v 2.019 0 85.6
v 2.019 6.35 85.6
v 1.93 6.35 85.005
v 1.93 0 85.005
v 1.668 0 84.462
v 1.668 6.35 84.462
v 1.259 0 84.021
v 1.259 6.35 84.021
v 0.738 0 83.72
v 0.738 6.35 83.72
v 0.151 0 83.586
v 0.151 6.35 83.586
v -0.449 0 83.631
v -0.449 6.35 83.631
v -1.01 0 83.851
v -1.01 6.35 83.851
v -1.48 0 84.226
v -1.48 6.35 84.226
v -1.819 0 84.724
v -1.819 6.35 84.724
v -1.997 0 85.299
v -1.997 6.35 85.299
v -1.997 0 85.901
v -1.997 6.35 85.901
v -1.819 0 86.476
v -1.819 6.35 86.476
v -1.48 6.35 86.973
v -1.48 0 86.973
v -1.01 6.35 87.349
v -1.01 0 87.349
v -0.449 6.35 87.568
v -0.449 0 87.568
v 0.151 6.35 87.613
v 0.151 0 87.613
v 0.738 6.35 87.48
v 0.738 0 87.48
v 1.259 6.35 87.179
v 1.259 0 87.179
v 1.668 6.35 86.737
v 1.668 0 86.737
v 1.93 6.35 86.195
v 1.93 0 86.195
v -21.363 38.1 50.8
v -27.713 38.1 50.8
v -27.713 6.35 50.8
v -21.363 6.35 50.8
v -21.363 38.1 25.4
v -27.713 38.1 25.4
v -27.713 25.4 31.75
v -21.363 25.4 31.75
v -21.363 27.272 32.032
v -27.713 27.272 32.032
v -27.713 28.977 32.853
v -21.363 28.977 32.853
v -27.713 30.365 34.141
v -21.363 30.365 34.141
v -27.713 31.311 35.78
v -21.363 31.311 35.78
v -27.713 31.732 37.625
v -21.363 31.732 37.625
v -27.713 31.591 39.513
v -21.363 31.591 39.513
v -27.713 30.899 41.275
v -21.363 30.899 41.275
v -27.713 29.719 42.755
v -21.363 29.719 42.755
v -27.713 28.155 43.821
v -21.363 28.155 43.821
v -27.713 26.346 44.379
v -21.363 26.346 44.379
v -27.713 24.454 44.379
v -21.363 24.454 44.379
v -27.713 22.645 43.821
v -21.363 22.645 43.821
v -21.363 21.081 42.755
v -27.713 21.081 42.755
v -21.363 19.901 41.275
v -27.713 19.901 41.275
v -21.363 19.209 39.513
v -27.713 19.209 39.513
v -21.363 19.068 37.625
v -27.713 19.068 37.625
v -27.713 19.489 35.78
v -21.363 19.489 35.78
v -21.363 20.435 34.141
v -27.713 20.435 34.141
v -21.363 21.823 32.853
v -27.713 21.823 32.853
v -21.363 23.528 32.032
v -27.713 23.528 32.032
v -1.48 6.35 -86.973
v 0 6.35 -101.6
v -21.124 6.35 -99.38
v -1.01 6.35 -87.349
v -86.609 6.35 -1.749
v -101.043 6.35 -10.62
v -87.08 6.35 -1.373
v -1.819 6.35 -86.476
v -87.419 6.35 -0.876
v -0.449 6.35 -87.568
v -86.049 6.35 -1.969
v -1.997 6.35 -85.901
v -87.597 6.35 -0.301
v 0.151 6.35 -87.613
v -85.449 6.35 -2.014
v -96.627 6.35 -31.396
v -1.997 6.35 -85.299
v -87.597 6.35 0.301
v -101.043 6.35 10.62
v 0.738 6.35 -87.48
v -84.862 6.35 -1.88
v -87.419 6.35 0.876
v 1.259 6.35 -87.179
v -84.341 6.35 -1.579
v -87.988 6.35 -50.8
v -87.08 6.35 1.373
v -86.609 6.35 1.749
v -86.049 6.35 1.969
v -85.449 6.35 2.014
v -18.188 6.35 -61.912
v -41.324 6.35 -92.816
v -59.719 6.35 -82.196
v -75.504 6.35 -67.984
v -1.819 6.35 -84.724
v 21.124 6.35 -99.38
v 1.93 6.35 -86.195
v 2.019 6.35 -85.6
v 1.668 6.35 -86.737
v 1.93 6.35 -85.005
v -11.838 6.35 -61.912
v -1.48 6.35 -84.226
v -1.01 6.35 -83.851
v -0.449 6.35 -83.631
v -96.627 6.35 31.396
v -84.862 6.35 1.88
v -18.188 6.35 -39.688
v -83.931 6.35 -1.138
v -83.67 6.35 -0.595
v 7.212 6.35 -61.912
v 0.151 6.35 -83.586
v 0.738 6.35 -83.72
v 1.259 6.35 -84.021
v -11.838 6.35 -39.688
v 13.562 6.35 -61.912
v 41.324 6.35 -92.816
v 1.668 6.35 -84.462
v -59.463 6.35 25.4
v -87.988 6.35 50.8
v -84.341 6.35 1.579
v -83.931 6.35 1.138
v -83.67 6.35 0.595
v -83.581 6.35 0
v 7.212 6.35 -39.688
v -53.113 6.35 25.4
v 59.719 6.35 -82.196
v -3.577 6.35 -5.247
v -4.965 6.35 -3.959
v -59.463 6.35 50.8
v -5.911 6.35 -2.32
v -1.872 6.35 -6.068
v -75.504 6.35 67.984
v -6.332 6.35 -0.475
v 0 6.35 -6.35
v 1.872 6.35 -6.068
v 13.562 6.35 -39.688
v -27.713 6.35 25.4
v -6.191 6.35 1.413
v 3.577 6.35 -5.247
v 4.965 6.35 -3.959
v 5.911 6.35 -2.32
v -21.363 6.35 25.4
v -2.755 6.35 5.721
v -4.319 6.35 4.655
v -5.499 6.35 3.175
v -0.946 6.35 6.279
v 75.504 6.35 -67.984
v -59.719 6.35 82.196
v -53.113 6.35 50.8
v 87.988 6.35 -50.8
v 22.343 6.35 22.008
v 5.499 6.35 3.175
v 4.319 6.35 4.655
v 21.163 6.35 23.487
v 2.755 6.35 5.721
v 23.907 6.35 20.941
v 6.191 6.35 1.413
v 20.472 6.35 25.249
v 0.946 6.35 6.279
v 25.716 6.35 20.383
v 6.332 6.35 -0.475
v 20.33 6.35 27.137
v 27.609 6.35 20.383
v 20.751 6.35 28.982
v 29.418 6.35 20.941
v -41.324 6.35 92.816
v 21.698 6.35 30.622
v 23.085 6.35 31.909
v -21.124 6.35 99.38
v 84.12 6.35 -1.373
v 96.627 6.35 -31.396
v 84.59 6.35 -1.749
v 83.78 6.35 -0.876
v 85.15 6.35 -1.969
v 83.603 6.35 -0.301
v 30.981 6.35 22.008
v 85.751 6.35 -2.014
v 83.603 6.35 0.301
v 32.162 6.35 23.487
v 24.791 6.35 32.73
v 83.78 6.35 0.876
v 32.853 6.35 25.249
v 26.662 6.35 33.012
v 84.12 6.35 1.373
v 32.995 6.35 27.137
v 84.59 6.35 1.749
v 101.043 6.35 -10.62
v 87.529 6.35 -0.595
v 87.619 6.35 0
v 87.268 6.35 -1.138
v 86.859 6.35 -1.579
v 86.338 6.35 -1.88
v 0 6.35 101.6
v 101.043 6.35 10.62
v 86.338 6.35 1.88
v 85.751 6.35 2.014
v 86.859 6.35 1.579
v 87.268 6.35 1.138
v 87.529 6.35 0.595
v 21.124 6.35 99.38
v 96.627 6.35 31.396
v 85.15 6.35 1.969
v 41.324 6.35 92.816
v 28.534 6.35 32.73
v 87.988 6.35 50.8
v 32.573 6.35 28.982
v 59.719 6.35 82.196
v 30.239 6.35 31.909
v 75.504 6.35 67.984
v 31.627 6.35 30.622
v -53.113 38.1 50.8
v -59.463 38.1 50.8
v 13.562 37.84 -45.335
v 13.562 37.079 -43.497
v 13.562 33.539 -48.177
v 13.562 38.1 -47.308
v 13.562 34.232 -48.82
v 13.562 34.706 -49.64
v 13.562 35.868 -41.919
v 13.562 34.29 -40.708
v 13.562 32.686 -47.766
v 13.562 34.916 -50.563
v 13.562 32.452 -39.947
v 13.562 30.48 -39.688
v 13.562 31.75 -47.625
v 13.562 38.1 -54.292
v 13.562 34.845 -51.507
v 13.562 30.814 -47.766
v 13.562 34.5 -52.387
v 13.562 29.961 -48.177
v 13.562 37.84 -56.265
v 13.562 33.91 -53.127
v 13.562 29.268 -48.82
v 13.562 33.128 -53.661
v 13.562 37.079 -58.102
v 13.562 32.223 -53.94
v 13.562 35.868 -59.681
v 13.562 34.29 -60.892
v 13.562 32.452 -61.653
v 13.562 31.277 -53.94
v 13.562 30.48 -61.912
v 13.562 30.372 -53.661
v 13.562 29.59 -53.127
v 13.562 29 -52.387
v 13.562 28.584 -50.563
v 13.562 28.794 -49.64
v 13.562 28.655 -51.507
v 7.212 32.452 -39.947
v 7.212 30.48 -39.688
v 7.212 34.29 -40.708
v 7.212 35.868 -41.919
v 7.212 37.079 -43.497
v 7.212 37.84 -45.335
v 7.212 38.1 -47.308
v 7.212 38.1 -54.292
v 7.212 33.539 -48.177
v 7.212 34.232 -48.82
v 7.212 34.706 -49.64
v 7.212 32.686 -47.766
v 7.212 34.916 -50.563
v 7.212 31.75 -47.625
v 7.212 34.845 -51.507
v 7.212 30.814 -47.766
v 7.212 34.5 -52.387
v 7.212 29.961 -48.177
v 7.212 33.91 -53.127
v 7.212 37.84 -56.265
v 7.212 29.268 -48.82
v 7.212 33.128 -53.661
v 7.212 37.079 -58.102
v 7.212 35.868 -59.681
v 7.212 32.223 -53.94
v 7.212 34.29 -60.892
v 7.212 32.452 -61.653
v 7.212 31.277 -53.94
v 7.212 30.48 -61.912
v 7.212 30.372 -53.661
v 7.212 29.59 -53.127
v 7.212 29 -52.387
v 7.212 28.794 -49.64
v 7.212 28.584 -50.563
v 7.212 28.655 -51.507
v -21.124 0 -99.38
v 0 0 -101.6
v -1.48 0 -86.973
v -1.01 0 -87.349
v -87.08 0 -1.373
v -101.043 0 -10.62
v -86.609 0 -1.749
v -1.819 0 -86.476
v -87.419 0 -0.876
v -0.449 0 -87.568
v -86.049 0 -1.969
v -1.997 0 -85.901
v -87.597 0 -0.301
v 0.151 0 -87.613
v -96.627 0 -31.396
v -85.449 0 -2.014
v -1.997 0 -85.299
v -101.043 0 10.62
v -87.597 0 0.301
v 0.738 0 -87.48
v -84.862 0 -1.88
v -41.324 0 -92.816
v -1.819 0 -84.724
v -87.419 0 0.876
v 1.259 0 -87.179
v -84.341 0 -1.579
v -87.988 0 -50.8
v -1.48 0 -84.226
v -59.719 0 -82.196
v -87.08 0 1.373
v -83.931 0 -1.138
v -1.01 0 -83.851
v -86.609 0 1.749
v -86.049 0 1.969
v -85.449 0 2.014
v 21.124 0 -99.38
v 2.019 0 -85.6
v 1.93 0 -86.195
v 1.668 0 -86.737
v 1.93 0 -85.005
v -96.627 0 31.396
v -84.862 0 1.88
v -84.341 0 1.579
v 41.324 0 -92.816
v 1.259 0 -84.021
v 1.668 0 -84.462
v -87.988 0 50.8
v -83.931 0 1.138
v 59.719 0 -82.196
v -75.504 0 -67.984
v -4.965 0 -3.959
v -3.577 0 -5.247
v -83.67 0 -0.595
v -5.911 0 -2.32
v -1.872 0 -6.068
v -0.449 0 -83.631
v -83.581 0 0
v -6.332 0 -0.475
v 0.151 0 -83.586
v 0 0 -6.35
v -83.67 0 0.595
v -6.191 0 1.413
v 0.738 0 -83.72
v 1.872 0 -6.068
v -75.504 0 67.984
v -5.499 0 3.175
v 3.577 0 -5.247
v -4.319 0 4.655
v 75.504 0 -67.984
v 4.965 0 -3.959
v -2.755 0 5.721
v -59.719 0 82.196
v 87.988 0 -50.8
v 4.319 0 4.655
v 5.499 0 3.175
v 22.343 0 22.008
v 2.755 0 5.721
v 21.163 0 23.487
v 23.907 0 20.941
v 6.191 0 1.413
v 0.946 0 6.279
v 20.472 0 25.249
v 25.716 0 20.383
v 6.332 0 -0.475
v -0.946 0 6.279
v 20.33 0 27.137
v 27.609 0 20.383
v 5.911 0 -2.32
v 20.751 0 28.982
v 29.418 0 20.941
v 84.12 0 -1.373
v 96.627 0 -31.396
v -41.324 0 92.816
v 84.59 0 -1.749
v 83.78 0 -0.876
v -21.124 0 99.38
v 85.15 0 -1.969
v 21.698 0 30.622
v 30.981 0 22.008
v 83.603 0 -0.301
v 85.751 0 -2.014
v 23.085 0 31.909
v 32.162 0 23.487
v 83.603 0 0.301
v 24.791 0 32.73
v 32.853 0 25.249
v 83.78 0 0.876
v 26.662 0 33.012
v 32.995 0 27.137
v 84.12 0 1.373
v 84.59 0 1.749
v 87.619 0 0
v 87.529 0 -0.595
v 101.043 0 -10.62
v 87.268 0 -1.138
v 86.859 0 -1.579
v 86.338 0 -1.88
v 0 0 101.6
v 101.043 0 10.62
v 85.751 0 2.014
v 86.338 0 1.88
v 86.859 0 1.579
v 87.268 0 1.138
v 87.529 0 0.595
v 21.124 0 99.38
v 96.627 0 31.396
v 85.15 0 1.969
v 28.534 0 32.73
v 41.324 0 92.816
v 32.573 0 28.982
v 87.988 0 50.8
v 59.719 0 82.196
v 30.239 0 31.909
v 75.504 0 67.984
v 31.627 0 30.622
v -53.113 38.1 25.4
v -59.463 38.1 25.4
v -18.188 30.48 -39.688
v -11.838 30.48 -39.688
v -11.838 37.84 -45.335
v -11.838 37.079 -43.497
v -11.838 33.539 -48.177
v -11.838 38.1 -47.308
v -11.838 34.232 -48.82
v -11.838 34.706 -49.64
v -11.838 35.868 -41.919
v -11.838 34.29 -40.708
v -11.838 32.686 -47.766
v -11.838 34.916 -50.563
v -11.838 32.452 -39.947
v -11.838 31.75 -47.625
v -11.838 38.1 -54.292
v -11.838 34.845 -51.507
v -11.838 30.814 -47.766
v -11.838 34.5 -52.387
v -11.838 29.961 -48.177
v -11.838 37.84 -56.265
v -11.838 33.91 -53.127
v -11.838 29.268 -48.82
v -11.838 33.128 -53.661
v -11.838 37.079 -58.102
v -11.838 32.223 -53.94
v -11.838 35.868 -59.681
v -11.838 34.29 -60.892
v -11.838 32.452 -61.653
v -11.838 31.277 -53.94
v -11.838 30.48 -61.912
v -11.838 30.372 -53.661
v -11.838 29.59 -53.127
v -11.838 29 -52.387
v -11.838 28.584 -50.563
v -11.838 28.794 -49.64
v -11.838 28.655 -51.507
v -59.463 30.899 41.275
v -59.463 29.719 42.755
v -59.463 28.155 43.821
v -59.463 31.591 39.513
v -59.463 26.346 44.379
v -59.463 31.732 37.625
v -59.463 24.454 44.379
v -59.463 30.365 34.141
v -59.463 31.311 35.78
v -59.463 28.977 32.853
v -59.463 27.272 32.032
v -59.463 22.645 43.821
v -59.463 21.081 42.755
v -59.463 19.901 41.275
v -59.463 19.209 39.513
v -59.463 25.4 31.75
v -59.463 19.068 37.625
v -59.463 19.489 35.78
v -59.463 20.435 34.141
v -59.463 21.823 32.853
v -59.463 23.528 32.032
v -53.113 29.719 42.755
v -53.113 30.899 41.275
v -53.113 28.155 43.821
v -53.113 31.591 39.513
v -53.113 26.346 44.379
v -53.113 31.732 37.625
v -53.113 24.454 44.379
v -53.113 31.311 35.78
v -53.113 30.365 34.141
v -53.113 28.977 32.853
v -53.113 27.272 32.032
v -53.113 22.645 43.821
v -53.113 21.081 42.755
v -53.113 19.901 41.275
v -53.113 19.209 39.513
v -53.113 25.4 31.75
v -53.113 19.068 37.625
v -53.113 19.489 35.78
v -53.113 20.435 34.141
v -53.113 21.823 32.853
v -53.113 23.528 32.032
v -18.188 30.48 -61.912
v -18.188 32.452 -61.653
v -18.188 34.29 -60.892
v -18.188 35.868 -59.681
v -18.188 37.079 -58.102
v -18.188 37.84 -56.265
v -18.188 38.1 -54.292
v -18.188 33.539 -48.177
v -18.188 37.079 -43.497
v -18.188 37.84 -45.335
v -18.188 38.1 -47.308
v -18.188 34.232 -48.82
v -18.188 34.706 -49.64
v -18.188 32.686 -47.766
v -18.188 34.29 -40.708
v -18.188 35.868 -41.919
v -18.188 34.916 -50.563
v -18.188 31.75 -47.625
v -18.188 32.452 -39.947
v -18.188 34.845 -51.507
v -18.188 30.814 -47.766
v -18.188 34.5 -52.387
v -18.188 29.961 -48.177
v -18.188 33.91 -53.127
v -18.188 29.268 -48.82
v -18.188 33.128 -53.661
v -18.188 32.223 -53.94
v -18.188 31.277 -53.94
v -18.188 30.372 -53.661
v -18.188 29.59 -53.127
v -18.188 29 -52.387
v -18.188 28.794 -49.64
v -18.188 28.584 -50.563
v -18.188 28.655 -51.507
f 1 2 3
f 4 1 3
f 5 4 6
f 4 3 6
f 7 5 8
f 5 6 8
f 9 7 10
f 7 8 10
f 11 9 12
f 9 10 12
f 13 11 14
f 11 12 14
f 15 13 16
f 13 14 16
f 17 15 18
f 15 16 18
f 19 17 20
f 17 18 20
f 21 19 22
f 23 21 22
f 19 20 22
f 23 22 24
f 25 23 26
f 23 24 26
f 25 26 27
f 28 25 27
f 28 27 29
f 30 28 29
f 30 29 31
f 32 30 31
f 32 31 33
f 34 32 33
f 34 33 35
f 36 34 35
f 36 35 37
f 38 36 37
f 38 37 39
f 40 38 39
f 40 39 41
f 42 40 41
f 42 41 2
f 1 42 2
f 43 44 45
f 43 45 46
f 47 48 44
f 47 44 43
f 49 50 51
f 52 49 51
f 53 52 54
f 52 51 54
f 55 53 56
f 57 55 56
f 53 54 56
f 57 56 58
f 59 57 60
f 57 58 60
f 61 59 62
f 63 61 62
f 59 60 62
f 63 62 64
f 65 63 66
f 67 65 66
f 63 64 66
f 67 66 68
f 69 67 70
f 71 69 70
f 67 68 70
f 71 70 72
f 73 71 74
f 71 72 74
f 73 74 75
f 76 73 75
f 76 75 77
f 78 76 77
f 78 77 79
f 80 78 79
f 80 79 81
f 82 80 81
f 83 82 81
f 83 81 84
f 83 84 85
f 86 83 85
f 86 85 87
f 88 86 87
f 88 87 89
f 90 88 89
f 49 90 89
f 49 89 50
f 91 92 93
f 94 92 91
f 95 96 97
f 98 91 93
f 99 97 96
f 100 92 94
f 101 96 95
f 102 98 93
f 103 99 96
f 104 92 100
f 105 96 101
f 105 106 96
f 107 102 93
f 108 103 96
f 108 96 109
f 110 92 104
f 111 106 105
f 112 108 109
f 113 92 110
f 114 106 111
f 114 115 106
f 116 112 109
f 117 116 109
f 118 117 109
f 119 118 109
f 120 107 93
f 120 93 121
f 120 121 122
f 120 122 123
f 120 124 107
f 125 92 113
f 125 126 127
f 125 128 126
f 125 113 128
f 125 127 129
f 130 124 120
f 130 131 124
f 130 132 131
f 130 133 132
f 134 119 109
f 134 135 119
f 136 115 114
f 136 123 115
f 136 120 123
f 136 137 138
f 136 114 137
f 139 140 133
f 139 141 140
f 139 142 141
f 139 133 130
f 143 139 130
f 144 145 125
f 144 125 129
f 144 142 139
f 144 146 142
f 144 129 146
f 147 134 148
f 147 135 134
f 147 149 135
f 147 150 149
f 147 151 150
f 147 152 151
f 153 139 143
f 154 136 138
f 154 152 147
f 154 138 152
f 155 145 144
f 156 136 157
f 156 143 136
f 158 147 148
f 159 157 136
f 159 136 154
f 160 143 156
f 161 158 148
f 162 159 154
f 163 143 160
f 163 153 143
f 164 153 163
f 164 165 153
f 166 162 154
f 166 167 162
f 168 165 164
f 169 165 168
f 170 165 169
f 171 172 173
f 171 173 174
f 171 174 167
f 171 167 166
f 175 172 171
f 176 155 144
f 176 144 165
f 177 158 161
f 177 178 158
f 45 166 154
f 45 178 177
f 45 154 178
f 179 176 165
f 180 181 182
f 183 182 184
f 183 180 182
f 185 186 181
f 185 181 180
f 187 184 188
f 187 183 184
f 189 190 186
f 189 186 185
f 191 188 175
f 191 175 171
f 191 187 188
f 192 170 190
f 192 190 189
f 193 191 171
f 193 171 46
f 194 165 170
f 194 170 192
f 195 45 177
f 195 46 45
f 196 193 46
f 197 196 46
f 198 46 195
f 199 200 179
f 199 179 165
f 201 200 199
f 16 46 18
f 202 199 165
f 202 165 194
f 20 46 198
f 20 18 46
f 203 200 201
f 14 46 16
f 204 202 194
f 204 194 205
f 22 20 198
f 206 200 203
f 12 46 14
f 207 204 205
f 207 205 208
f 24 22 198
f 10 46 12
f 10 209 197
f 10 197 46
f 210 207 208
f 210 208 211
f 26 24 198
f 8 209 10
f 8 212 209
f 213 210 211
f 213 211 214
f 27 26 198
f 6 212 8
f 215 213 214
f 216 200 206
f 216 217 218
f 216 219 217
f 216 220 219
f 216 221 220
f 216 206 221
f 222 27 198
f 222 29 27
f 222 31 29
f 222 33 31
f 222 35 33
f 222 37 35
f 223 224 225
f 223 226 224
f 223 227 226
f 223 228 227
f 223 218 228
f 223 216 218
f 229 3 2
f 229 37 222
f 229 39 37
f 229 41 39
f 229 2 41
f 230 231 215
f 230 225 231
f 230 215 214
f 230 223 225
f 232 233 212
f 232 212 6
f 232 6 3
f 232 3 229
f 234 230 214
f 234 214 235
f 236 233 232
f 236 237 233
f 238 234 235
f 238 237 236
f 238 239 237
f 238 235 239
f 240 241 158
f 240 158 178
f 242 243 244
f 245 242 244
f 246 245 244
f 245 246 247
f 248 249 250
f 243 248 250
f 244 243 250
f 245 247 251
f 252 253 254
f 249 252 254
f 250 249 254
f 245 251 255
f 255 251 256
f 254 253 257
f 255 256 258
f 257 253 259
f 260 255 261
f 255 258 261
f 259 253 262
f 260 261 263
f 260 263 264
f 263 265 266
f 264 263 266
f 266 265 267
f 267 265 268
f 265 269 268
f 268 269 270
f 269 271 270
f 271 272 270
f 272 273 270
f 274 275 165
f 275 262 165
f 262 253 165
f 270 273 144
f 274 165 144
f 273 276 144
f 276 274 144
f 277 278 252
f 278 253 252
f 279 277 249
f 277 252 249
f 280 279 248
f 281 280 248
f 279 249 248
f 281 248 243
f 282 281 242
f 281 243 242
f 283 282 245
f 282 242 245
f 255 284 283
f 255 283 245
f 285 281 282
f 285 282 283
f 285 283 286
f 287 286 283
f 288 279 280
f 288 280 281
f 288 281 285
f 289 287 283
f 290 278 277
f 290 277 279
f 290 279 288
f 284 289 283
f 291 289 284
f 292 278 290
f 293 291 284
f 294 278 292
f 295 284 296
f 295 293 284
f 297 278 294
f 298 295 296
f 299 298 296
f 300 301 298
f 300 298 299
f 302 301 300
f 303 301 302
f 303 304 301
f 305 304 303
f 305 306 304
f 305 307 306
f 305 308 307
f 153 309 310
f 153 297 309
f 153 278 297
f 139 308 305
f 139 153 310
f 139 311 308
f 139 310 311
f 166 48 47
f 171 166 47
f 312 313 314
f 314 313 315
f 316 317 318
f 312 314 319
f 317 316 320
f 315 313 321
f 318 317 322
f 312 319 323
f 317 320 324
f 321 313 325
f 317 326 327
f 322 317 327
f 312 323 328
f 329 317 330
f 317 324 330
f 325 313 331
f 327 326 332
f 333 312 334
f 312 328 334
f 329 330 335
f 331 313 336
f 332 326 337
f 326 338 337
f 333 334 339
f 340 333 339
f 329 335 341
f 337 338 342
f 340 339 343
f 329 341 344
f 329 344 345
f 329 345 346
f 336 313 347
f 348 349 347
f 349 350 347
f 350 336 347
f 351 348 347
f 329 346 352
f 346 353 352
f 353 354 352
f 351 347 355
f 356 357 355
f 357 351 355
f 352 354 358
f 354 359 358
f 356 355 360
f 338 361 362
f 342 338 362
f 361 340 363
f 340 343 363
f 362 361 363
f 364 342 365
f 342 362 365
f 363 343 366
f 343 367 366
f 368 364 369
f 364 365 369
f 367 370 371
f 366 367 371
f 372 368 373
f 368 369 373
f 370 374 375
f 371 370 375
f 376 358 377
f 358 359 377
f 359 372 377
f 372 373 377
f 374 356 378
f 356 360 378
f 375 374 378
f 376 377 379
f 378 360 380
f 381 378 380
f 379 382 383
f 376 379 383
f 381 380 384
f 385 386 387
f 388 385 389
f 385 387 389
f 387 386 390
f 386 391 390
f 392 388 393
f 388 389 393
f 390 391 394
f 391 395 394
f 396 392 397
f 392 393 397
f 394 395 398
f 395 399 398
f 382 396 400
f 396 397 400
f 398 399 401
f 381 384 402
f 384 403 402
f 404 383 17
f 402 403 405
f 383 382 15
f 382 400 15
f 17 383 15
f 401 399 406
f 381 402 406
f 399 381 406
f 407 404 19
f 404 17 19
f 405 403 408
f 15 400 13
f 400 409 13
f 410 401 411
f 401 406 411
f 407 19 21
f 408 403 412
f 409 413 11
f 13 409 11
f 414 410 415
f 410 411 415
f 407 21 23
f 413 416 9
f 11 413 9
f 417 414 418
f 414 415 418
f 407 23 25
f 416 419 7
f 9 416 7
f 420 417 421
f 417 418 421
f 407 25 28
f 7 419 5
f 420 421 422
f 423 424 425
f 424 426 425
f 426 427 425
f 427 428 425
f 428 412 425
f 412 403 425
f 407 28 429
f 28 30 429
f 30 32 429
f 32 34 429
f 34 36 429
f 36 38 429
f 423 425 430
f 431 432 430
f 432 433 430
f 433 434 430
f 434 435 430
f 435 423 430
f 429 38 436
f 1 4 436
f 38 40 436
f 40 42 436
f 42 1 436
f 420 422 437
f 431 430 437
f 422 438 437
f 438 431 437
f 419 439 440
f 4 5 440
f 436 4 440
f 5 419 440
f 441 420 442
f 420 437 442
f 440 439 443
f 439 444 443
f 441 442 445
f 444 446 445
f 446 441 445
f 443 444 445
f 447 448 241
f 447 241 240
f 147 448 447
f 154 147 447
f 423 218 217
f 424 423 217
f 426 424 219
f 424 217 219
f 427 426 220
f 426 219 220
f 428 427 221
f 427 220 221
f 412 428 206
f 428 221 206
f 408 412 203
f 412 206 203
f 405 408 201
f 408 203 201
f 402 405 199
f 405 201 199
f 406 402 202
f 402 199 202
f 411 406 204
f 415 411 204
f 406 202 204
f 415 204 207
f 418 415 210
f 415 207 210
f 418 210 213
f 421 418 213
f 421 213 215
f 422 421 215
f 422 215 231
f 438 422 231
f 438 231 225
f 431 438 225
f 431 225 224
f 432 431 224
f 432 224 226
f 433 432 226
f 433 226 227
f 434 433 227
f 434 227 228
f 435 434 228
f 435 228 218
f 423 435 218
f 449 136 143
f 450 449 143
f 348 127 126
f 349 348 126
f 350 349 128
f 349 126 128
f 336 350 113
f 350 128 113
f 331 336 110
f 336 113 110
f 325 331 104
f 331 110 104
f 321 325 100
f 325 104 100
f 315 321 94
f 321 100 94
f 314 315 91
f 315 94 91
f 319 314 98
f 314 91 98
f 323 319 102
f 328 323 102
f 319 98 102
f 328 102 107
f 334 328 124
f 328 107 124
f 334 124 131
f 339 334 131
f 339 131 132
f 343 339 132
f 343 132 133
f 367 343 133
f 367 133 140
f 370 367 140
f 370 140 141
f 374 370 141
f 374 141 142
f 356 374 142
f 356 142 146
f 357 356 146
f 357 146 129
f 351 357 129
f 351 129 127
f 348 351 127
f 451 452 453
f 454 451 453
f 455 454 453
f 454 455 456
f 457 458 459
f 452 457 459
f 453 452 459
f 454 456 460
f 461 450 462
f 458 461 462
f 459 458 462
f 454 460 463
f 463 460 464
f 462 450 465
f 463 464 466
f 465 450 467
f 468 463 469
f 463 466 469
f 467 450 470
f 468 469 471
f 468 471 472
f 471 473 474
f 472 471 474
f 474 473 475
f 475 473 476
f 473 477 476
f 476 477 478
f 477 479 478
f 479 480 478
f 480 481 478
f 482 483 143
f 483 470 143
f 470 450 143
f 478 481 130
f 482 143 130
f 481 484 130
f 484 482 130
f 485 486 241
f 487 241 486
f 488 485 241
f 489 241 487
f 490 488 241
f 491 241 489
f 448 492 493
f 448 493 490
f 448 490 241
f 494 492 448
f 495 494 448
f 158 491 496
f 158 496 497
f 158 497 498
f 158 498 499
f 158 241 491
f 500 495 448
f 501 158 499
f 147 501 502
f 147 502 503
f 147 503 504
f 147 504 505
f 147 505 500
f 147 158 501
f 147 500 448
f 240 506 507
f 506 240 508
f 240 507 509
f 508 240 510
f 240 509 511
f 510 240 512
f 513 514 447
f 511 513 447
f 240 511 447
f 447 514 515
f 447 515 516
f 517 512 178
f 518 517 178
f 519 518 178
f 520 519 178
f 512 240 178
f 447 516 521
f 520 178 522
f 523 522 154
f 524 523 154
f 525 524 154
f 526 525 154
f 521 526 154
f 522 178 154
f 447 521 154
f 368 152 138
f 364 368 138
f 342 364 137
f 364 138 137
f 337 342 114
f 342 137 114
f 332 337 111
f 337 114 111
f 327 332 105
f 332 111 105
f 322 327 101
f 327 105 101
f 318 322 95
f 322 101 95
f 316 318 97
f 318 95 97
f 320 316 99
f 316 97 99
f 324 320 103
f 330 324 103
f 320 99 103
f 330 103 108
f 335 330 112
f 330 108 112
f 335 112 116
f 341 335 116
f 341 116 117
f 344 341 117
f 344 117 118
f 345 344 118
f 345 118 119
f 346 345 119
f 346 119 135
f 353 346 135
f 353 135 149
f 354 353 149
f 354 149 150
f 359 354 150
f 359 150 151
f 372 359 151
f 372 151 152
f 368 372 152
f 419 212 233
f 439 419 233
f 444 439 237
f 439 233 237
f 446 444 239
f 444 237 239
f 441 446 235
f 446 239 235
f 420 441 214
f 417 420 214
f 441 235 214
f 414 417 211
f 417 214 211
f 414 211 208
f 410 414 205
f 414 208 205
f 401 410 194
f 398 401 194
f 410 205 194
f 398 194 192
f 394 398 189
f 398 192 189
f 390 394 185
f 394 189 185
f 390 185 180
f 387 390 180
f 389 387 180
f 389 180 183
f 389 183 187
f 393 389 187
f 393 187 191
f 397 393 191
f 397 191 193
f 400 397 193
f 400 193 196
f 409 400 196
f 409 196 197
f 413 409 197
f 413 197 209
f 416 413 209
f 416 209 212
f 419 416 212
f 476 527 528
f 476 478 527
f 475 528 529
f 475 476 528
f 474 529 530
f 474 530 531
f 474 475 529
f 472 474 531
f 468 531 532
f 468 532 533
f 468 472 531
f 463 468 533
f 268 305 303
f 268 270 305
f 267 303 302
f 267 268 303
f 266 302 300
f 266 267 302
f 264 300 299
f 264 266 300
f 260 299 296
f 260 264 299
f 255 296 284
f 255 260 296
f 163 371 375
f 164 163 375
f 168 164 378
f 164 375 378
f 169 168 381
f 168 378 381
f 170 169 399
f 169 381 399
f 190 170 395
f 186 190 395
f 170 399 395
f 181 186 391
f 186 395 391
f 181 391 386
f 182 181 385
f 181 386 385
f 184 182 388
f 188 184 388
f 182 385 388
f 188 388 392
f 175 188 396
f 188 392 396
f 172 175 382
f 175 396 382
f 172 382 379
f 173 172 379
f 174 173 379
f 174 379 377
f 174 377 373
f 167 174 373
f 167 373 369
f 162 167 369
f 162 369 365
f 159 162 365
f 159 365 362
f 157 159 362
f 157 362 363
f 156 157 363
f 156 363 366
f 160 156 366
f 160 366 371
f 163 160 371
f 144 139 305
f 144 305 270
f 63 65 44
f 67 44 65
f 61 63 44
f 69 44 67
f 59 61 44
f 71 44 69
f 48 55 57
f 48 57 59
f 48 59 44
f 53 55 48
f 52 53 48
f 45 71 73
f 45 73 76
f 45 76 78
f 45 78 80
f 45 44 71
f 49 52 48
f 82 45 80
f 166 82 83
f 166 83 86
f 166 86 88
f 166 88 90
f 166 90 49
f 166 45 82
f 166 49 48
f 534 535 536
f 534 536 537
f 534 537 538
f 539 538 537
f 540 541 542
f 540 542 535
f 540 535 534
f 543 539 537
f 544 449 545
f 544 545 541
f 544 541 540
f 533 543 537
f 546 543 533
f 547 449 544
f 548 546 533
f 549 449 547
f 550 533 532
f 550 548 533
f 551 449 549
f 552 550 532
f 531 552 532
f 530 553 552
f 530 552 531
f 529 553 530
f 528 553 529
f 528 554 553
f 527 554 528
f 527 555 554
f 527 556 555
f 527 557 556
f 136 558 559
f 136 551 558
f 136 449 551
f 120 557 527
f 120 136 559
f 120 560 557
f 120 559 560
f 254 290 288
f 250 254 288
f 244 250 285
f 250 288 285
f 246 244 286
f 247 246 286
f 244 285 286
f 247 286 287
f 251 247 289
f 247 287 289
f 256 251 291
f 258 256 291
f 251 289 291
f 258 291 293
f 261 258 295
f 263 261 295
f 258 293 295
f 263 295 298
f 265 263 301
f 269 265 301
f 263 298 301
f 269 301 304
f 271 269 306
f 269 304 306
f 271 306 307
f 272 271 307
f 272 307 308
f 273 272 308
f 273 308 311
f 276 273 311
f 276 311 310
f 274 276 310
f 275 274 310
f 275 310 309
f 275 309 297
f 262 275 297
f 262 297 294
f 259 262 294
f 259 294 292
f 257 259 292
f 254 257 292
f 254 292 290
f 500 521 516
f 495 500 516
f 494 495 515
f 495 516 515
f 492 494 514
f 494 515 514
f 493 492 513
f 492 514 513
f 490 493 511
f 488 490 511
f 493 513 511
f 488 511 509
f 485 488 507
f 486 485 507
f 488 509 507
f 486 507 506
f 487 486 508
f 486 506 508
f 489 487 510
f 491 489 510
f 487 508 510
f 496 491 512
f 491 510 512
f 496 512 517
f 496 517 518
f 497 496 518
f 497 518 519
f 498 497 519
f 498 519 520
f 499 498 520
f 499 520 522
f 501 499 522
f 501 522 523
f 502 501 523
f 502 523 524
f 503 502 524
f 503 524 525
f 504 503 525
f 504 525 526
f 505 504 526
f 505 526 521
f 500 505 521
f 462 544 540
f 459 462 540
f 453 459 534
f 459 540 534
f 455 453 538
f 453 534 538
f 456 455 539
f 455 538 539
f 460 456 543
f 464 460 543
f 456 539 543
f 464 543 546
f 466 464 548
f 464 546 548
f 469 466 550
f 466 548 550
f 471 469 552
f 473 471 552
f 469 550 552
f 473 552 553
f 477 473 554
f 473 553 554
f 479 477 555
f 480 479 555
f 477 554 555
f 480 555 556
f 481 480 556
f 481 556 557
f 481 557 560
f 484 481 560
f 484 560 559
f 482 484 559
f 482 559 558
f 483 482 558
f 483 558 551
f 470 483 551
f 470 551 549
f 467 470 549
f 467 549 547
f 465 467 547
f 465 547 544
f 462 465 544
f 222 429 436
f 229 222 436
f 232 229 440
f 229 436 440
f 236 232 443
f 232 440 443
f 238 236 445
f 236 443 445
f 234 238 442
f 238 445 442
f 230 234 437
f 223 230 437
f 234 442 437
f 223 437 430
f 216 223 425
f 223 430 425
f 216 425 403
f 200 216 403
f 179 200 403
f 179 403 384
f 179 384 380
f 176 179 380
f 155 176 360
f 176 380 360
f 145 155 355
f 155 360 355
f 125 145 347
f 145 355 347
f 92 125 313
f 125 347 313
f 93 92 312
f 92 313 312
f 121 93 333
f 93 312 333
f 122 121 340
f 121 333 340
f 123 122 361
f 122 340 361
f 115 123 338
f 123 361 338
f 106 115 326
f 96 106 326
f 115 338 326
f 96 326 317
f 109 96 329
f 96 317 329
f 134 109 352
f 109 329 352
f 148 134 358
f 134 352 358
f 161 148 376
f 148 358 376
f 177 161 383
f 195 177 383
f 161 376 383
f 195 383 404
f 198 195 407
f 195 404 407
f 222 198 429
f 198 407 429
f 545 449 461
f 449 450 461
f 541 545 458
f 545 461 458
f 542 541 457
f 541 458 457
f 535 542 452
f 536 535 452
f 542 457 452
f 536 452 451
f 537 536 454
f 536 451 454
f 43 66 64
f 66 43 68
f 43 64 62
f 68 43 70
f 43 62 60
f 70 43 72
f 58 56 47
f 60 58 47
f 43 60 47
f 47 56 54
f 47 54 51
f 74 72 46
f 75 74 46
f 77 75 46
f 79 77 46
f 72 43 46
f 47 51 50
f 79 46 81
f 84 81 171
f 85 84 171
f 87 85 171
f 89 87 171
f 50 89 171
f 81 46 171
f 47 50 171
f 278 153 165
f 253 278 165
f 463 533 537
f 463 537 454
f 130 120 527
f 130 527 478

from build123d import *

# Parameters (mm, degrees)
SKETCH1_R                  = 101.6
BOSS_EXTRUDE1_DEPTH        = 6.35
SKETCH2_R                  = 6.35
CUT_EXTRUDE1_DEPTH         = 144.824345992
SKETCH3_W                  = 6.35
SKETCH3_H                  = 25.4
BOSS_EXTRUDE2_DEPTH        = 31.75
CUT_EXTRUDE2_REACH         = 165.994
SKETCH4_R                  = 6.35
SKETCH5_W                  = 6.35
SKETCH5_H                  = 22.225
BOSS_EXTRUDE3_DEPTH        = 31.75
CUT_EXTRUDE3_REACH         = 163.627
SKETCH6_R                  = 3.175
F_10_32_TAPPED_HOLE1_D     = 4.0386
F_10_32_TAPPED_HOLE1_DEPTH = 12.02944
F_10_32_TAPPED_HOLE1_TIP   = 1.213317848
FILLET1_R                  = 7.62
SKETCH9_R                  = 6.35
CUT_EXTRUDE4_DEPTH         = 148.150203873


with BuildPart() as part:
    # Sketch1 → Boss-Extrude1 (new body)
    with BuildSketch(Plane(origin=(0, 0, 0), x_dir=(1, 0, 0), z_dir=(0, 1, 0))):
        with Locations(Location((0, 0, 0), (0, 0, 270))):
            Circle(SKETCH1_R)
    extrude(amount=BOSS_EXTRUDE1_DEPTH)

    # Sketch2 → Cut-Extrude1 (cut, through all)
    with BuildSketch(Plane.XZ):
        with Locations(Location((0, 0, 0), (0, 0, 270))):
            Circle(SKETCH2_R)
    extrude(amount=-CUT_EXTRUDE1_DEPTH, mode=Mode.SUBTRACT)

    # Sketch3 → Boss-Extrude2 (add)
    with BuildSketch(Plane(origin=(0, 6.35, 0), x_dir=(1, 0, 0), z_dir=(0, 1, 0))):
        with Locations((-56.28767, -38.1)):
            Rectangle(SKETCH3_W, SKETCH3_H)
        with Locations((-24.53767, -38.1)):
            Rectangle(SKETCH3_W, SKETCH3_H)
    extrude(amount=BOSS_EXTRUDE2_DEPTH)

    # Cut-Extrude2: up to this face of the body (flat: up to its plane)
    cut_extrude2_end = Plane(part.part.faces().sort_by_distance((-59.46267, 22.225, 38.1))[0])
    # Sketch4 → Cut-Extrude2 (cut, up to the picked face)
    with BuildSketch(Plane(origin=(-21.36267, 0, 0), x_dir=(0, 0, -1), z_dir=(1, 0, 0)), mode=Mode.PRIVATE) as cut_extrude2_sk1:
        with Locations((-38.1, 25.4)):
            Circle(SKETCH4_R)
    cut_extrude2_tool1 = split(extrude(cut_extrude2_sk1.sketch, amount=-CUT_EXTRUDE2_REACH, mode=Mode.PRIVATE), bisect_by=cut_extrude2_end, keep=Keep.BOTH, mode=Mode.PRIVATE)
    add(cut_extrude2_tool1.solids().sort_by(Axis((-21.36267, 25.4, 38.1), (-1, 0, 0)))[0], mode=Mode.SUBTRACT)

    # Sketch5 → Boss-Extrude3 (add)
    with BuildSketch(Plane(origin=(0, 6.35, 0), x_dir=(1, 0, 0), z_dir=(0, 1, 0))):
        with Locations((-15.01267, 50.8)):
            Rectangle(SKETCH5_W, SKETCH5_H)
        with Locations((10.38733, 50.8)):
            Rectangle(SKETCH5_W, SKETCH5_H)
    extrude(amount=BOSS_EXTRUDE3_DEPTH)

    # Cut-Extrude3: up to this face of the body (flat: up to its plane)
    cut_extrude3_end = Plane(part.part.faces().sort_by_distance((13.56233, 22.225, -50.8))[0])
    # Sketch6 → Cut-Extrude3 (cut, up to the picked face)
    with BuildSketch(Plane.ZY.offset(18.18767), mode=Mode.PRIVATE) as cut_extrude3_sk1:
        with Locations((-50.8, 31.75)):
            Circle(SKETCH6_R)
    cut_extrude3_tool1 = split(extrude(cut_extrude3_sk1.sketch, amount=-CUT_EXTRUDE3_REACH, mode=Mode.PRIVATE), bisect_by=cut_extrude3_end, keep=Keep.BOTH, mode=Mode.PRIVATE)
    add(cut_extrude3_tool1.solids().sort_by(Axis((-18.18767, 31.75, -50.8), (1, 0, 0)))[0], mode=Mode.SUBTRACT)

    # #10-32 Tapped Hole1
    with Locations(Plane(origin=(0, 0, 0), x_dir=(-1, 0, 0), z_dir=(0, -1, 0))):
        with Locations((0, 0), (0, -85.599801346), (-85.599801346, 0), (0, 85.599801346), (85.599801346, 0)):
            Hole(F_10_32_TAPPED_HOLE1_D / 2, depth=F_10_32_TAPPED_HOLE1_DEPTH)
            with Locations((0, 0, -(F_10_32_TAPPED_HOLE1_DEPTH + F_10_32_TAPPED_HOLE1_TIP / 2))):  # 118° drill point
                Cone(0, F_10_32_TAPPED_HOLE1_D / 2, F_10_32_TAPPED_HOLE1_TIP, mode=Mode.SUBTRACT)

    # Fillet1
    fillet1_edges = [part.edges().sort_by_distance(p)[0] for p in [
        (-15.01267, 38.1, -39.6875),
        (-15.01267, 38.1, -61.9125),
        (10.38733, 38.1, -39.6875),
        (10.38733, 38.1, -61.9125),
    ]]
    fillet(fillet1_edges, radius=FILLET1_R)

    # Sketch9 → Cut-Extrude4 (cut, through all)
    with BuildSketch(Plane(origin=(0, 6.35, 0), x_dir=(1, 0, 0), z_dir=(0, 1, 0))):
        with Locations(Location((26.662380423, -26.662380423, 0), (0, 0, 270))):
            Circle(SKETCH9_R)
    extrude(amount=-CUT_EXTRUDE4_DEPTH, mode=Mode.SUBTRACT)


solid = part.part
